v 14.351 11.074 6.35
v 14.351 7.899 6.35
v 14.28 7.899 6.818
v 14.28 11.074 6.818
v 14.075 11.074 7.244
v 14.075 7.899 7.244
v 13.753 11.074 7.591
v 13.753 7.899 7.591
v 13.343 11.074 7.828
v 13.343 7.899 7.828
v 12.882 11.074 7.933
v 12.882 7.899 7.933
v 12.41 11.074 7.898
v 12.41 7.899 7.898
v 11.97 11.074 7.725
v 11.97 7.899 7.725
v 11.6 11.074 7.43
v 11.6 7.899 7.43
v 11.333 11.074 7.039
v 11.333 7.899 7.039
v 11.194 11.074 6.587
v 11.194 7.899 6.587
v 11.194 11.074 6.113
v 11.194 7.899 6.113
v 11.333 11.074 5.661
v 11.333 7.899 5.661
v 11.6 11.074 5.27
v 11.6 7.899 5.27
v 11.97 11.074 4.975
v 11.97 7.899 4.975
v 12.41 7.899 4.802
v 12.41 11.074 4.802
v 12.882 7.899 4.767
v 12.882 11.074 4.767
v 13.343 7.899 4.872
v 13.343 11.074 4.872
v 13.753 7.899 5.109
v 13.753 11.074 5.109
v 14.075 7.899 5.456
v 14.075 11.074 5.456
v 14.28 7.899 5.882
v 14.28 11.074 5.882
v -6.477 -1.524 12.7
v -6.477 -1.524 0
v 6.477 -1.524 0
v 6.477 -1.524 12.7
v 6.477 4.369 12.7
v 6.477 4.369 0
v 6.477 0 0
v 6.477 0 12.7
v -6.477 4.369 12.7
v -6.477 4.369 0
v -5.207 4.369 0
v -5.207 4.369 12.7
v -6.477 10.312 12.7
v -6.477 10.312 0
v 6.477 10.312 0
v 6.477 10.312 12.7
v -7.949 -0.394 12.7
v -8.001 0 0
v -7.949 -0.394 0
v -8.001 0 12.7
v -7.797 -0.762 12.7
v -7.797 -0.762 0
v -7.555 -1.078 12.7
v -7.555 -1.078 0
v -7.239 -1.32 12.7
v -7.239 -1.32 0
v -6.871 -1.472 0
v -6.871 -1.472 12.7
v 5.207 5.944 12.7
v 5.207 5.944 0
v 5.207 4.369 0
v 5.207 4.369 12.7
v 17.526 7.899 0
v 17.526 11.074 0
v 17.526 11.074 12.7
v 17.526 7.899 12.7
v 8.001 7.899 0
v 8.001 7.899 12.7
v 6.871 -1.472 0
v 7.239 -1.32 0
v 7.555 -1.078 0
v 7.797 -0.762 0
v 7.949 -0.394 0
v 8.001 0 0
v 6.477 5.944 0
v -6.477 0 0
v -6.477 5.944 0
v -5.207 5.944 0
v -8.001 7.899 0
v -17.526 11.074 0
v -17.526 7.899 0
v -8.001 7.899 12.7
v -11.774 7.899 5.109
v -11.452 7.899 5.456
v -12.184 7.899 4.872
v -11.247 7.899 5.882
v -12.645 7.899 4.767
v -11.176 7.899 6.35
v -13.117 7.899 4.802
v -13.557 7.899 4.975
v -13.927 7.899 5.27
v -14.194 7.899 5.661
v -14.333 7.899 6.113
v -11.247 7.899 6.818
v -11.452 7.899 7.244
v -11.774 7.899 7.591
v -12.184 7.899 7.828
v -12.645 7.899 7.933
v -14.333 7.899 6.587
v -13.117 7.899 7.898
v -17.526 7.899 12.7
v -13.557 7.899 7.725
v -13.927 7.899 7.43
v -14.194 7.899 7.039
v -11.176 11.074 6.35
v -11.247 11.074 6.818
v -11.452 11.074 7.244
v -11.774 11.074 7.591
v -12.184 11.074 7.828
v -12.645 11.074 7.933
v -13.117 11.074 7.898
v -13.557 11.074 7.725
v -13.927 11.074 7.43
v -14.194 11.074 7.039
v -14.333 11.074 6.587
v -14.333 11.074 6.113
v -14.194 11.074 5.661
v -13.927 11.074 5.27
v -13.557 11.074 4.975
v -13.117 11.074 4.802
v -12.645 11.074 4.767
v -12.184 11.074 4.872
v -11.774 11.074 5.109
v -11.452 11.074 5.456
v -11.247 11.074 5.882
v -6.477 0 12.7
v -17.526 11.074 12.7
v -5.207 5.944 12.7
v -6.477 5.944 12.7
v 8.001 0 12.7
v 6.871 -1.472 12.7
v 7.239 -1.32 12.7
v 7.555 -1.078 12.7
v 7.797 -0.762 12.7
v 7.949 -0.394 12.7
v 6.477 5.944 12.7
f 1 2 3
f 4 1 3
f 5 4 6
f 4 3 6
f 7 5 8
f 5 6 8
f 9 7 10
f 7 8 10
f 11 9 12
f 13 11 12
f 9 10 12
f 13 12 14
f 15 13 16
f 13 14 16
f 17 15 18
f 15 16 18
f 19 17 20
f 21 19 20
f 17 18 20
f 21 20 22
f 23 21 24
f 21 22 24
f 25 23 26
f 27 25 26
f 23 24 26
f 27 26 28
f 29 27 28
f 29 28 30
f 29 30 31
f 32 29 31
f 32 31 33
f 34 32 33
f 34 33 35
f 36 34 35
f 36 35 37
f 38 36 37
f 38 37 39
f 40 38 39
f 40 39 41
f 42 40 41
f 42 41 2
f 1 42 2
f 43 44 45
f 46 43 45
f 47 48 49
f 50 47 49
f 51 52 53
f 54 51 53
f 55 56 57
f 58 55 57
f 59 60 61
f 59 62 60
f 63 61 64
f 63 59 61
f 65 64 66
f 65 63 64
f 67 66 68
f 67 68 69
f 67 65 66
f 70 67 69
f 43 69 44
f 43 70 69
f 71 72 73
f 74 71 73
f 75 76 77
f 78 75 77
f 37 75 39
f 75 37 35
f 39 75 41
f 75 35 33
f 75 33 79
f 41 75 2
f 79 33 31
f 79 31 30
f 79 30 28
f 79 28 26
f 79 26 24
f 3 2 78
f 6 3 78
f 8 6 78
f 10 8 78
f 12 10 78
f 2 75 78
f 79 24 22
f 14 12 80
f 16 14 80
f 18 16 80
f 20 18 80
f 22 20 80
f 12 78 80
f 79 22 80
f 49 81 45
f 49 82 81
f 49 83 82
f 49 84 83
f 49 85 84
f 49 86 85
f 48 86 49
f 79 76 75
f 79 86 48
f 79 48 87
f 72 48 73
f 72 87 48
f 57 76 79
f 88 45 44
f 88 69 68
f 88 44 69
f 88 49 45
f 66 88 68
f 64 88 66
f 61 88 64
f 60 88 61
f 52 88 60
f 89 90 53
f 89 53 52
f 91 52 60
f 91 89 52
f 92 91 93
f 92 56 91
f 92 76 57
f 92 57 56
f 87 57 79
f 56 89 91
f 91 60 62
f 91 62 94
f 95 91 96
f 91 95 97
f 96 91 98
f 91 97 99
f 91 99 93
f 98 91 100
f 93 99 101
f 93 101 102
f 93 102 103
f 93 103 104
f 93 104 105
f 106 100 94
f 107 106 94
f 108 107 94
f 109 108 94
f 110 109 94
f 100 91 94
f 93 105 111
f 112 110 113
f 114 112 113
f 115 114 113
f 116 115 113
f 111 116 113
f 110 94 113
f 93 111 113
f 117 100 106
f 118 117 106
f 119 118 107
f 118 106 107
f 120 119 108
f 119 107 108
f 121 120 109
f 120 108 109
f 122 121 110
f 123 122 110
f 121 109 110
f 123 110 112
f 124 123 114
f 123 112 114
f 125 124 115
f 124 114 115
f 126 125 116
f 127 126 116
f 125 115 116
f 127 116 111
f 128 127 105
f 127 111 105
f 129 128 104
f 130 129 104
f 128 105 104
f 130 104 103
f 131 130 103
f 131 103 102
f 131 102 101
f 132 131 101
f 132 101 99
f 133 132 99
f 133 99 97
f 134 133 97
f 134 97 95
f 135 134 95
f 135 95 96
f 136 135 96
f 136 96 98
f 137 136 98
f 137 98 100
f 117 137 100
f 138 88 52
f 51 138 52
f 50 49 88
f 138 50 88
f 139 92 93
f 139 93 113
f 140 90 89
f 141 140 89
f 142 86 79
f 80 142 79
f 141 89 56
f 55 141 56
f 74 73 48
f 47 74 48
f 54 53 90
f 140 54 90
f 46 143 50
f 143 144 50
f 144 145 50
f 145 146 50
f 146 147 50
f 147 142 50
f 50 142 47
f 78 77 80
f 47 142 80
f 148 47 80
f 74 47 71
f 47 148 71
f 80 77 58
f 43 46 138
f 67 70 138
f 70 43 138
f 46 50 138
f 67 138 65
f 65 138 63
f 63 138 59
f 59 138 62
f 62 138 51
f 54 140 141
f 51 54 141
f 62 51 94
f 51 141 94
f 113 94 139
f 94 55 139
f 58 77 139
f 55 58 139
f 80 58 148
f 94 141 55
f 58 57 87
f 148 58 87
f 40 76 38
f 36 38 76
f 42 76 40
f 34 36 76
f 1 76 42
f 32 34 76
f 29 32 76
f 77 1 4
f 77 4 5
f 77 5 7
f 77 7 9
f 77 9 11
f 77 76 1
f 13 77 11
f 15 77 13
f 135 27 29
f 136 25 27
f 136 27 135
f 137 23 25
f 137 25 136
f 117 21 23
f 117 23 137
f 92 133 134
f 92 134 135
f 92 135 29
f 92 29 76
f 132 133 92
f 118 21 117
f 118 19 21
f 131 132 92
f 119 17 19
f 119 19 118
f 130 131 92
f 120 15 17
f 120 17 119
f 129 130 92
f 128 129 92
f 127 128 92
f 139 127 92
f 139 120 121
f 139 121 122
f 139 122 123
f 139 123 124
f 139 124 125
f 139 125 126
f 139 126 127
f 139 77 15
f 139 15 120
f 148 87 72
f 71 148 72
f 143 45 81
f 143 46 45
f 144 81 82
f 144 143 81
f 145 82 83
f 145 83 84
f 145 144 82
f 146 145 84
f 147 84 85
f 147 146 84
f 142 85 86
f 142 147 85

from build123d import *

# Parameters (mm, degrees)
F0_W     = 16.002
F0_H     = 12.5984
F1_DEPTH = 12.7
F2_W     = 9.525
F2_H     = 12.7
F3_DEPTH = 3.175
F4_R     = 1.524
F5_R     = 1.5875
F6_DEPTH = 25.4


with BuildPart() as f1:
    # F0 (on Top) → F1 (new body)
    with BuildSketch(Plane.XY):
        with Locations((0, 4.7752)):
            Rectangle(F0_W, F0_H)
        Polygon((6.477, 4.3688), (6.477, 0), (-6.477, 0), (-6.477, 4.3688), (-5.207, 4.3688), (-5.207, 5.9436), (-6.477, 5.9436), (-6.477, 10.3124), (6.477, 10.3124), (6.477, 5.9436), (5.207, 5.9436), (5.207, 4.3688), align=None, mode=Mode.SUBTRACT)
    extrude(amount=F1_DEPTH)

    # F2 (on face) → F3 (join)
    with BuildSketch(Plane(origin=(0, 11.0744, 0), x_dir=(-1, 0, 0), z_dir=(0, 1, 0))):
        with Locations((12.7635, 6.35)):
            Rectangle(F2_W, F2_H)
        with Locations((-12.7635, 6.35)):
            Rectangle(F2_W, F2_H)
    extrude(amount=-F3_DEPTH)

    # F4
    f4_edges = [f1.edges().sort_by_distance(p)[0] for p in [
        (-8.001, -1.524, 6.35),
        (8.001, -1.524, 6.35),
    ]]
    fillet(f4_edges, radius=F4_R)

    # F5 (on face) → F6 (cut)
    with BuildSketch(Plane.XZ.offset(-7.8994)):
        with Locations((-12.7635, 6.35)):
            Circle(F5_R)
        with Locations((12.7635, 6.35)):
            Circle(F5_R)
    extrude(amount=-F6_DEPTH, mode=Mode.SUBTRACT)


solid = f1.part
